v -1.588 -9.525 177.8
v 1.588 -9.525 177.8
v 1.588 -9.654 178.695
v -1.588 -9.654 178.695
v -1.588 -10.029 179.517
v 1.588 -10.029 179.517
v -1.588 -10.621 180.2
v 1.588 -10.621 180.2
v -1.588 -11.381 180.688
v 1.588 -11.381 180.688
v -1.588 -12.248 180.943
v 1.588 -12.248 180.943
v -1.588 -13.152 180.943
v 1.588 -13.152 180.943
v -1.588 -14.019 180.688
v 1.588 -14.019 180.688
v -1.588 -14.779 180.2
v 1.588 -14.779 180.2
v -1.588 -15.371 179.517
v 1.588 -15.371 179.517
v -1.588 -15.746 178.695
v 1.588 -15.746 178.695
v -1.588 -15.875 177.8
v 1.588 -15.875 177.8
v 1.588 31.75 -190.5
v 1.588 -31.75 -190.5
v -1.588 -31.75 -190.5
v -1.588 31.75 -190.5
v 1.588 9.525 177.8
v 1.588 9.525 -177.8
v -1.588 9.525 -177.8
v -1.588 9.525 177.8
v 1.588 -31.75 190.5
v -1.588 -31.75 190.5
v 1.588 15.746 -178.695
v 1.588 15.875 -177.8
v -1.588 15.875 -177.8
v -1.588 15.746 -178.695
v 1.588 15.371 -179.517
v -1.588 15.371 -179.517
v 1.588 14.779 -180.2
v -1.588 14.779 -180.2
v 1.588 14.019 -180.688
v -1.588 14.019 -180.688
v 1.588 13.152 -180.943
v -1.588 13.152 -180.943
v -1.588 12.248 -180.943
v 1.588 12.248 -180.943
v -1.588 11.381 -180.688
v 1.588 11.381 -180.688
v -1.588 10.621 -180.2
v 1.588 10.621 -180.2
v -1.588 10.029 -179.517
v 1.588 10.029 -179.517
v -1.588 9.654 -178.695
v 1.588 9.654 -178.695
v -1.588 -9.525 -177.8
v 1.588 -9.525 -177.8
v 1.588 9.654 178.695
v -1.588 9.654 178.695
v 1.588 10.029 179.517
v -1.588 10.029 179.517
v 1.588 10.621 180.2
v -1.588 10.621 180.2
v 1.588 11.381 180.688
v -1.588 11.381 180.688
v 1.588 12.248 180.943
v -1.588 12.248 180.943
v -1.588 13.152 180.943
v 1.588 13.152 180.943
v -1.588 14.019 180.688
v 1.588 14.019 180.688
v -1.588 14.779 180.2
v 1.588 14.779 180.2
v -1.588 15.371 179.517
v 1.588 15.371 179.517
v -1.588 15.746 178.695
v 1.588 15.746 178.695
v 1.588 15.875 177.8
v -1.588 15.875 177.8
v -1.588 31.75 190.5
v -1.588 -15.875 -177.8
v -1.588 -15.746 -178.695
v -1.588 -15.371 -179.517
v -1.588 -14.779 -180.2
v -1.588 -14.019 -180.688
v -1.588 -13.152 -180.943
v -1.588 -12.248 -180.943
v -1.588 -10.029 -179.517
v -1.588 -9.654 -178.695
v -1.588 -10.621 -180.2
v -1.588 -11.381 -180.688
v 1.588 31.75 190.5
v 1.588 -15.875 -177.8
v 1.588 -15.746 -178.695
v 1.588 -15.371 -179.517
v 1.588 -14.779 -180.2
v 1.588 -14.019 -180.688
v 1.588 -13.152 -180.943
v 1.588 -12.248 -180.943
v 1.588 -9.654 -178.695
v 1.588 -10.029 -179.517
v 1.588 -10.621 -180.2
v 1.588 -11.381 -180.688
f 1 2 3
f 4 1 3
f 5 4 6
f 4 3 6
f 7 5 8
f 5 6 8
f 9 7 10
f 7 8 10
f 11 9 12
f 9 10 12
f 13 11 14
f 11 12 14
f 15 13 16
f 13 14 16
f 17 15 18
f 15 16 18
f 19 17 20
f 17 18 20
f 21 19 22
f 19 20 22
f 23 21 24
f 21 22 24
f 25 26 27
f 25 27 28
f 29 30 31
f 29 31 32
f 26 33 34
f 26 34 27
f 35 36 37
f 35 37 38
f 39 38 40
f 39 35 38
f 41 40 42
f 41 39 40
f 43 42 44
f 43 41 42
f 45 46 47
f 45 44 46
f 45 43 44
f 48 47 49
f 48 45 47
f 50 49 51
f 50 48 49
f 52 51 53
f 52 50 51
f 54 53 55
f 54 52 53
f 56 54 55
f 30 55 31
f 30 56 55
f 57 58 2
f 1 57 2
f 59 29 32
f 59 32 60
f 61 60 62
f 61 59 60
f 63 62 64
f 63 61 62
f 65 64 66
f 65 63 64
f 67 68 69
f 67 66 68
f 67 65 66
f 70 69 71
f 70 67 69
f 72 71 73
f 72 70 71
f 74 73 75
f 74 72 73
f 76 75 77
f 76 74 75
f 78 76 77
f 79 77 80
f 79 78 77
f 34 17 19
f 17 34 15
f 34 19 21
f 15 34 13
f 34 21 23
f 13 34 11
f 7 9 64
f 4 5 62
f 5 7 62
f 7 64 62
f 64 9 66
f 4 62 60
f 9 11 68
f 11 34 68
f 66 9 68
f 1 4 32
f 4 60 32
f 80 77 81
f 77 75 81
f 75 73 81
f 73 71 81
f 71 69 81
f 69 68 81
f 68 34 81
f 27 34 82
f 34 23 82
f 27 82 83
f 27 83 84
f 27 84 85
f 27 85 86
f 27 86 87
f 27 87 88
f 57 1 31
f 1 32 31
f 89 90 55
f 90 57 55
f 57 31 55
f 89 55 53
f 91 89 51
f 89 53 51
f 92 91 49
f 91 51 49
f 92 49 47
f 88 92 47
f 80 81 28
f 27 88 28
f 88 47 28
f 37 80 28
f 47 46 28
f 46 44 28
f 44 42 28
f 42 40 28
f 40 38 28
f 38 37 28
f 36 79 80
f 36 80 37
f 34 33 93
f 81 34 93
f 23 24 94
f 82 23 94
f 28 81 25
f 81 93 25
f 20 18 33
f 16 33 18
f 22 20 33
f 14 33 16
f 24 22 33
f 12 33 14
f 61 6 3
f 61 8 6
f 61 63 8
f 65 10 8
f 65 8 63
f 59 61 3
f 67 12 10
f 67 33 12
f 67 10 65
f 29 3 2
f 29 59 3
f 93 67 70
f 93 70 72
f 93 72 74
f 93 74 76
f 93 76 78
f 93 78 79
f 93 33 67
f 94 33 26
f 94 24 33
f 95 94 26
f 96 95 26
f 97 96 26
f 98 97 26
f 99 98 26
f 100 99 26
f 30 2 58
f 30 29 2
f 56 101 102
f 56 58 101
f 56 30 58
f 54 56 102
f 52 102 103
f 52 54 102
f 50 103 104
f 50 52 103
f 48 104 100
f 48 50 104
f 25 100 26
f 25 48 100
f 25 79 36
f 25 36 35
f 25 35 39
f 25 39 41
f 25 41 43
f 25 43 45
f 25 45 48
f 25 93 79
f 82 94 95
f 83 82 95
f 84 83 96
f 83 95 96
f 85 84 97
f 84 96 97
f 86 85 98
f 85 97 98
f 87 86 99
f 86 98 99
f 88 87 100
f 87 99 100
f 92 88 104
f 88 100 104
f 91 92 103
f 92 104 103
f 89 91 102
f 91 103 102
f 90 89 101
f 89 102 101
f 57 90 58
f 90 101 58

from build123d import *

# Parameters (mm, degrees)
SKETCH1_W       = 381
SKETCH1_H       = 63.5
OUTER_CUT_DEPTH = 1.5875
SLOTS_DEPTH     = 194.153806913


with BuildPart() as part:
    # Sketch1 → Outer Cut (new, symmetric)
    with BuildSketch(Plane(origin=(0, 0, 0), x_dir=(0, 0, -1), z_dir=(1, 0, 0))):
        Rectangle(SKETCH1_W, SKETCH1_H)
    extrude(amount=OUTER_CUT_DEPTH, both=True)

    # Sketch2 → Slots (cut, through all)
    with BuildSketch(Plane(origin=(1.5875, 0, 0), x_dir=(0, 0, -1), z_dir=(1, 0, 0))):
        with BuildLine():
            Line((-177.8, 15.875), (177.8, 15.875))
            ThreePointArc((177.8, 15.875), (180.975, 12.7), (177.8, 9.525))
            Line((177.8, 9.525), (-177.8, 9.525))
            ThreePointArc((-177.8, 9.525), (-180.975, 12.7), (-177.8, 15.875))
        make_face()
        with BuildLine():
            Line((-177.8, -15.875), (177.8, -15.875))
            ThreePointArc((177.8, -15.875), (180.975, -12.7), (177.8, -9.525))
            Line((177.8, -9.525), (-177.8, -9.525))
            ThreePointArc((-177.8, -9.525), (-180.975, -12.7), (-177.8, -15.875))
        make_face()
    extrude(amount=-SLOTS_DEPTH, mode=Mode.SUBTRACT)


solid = part.part
